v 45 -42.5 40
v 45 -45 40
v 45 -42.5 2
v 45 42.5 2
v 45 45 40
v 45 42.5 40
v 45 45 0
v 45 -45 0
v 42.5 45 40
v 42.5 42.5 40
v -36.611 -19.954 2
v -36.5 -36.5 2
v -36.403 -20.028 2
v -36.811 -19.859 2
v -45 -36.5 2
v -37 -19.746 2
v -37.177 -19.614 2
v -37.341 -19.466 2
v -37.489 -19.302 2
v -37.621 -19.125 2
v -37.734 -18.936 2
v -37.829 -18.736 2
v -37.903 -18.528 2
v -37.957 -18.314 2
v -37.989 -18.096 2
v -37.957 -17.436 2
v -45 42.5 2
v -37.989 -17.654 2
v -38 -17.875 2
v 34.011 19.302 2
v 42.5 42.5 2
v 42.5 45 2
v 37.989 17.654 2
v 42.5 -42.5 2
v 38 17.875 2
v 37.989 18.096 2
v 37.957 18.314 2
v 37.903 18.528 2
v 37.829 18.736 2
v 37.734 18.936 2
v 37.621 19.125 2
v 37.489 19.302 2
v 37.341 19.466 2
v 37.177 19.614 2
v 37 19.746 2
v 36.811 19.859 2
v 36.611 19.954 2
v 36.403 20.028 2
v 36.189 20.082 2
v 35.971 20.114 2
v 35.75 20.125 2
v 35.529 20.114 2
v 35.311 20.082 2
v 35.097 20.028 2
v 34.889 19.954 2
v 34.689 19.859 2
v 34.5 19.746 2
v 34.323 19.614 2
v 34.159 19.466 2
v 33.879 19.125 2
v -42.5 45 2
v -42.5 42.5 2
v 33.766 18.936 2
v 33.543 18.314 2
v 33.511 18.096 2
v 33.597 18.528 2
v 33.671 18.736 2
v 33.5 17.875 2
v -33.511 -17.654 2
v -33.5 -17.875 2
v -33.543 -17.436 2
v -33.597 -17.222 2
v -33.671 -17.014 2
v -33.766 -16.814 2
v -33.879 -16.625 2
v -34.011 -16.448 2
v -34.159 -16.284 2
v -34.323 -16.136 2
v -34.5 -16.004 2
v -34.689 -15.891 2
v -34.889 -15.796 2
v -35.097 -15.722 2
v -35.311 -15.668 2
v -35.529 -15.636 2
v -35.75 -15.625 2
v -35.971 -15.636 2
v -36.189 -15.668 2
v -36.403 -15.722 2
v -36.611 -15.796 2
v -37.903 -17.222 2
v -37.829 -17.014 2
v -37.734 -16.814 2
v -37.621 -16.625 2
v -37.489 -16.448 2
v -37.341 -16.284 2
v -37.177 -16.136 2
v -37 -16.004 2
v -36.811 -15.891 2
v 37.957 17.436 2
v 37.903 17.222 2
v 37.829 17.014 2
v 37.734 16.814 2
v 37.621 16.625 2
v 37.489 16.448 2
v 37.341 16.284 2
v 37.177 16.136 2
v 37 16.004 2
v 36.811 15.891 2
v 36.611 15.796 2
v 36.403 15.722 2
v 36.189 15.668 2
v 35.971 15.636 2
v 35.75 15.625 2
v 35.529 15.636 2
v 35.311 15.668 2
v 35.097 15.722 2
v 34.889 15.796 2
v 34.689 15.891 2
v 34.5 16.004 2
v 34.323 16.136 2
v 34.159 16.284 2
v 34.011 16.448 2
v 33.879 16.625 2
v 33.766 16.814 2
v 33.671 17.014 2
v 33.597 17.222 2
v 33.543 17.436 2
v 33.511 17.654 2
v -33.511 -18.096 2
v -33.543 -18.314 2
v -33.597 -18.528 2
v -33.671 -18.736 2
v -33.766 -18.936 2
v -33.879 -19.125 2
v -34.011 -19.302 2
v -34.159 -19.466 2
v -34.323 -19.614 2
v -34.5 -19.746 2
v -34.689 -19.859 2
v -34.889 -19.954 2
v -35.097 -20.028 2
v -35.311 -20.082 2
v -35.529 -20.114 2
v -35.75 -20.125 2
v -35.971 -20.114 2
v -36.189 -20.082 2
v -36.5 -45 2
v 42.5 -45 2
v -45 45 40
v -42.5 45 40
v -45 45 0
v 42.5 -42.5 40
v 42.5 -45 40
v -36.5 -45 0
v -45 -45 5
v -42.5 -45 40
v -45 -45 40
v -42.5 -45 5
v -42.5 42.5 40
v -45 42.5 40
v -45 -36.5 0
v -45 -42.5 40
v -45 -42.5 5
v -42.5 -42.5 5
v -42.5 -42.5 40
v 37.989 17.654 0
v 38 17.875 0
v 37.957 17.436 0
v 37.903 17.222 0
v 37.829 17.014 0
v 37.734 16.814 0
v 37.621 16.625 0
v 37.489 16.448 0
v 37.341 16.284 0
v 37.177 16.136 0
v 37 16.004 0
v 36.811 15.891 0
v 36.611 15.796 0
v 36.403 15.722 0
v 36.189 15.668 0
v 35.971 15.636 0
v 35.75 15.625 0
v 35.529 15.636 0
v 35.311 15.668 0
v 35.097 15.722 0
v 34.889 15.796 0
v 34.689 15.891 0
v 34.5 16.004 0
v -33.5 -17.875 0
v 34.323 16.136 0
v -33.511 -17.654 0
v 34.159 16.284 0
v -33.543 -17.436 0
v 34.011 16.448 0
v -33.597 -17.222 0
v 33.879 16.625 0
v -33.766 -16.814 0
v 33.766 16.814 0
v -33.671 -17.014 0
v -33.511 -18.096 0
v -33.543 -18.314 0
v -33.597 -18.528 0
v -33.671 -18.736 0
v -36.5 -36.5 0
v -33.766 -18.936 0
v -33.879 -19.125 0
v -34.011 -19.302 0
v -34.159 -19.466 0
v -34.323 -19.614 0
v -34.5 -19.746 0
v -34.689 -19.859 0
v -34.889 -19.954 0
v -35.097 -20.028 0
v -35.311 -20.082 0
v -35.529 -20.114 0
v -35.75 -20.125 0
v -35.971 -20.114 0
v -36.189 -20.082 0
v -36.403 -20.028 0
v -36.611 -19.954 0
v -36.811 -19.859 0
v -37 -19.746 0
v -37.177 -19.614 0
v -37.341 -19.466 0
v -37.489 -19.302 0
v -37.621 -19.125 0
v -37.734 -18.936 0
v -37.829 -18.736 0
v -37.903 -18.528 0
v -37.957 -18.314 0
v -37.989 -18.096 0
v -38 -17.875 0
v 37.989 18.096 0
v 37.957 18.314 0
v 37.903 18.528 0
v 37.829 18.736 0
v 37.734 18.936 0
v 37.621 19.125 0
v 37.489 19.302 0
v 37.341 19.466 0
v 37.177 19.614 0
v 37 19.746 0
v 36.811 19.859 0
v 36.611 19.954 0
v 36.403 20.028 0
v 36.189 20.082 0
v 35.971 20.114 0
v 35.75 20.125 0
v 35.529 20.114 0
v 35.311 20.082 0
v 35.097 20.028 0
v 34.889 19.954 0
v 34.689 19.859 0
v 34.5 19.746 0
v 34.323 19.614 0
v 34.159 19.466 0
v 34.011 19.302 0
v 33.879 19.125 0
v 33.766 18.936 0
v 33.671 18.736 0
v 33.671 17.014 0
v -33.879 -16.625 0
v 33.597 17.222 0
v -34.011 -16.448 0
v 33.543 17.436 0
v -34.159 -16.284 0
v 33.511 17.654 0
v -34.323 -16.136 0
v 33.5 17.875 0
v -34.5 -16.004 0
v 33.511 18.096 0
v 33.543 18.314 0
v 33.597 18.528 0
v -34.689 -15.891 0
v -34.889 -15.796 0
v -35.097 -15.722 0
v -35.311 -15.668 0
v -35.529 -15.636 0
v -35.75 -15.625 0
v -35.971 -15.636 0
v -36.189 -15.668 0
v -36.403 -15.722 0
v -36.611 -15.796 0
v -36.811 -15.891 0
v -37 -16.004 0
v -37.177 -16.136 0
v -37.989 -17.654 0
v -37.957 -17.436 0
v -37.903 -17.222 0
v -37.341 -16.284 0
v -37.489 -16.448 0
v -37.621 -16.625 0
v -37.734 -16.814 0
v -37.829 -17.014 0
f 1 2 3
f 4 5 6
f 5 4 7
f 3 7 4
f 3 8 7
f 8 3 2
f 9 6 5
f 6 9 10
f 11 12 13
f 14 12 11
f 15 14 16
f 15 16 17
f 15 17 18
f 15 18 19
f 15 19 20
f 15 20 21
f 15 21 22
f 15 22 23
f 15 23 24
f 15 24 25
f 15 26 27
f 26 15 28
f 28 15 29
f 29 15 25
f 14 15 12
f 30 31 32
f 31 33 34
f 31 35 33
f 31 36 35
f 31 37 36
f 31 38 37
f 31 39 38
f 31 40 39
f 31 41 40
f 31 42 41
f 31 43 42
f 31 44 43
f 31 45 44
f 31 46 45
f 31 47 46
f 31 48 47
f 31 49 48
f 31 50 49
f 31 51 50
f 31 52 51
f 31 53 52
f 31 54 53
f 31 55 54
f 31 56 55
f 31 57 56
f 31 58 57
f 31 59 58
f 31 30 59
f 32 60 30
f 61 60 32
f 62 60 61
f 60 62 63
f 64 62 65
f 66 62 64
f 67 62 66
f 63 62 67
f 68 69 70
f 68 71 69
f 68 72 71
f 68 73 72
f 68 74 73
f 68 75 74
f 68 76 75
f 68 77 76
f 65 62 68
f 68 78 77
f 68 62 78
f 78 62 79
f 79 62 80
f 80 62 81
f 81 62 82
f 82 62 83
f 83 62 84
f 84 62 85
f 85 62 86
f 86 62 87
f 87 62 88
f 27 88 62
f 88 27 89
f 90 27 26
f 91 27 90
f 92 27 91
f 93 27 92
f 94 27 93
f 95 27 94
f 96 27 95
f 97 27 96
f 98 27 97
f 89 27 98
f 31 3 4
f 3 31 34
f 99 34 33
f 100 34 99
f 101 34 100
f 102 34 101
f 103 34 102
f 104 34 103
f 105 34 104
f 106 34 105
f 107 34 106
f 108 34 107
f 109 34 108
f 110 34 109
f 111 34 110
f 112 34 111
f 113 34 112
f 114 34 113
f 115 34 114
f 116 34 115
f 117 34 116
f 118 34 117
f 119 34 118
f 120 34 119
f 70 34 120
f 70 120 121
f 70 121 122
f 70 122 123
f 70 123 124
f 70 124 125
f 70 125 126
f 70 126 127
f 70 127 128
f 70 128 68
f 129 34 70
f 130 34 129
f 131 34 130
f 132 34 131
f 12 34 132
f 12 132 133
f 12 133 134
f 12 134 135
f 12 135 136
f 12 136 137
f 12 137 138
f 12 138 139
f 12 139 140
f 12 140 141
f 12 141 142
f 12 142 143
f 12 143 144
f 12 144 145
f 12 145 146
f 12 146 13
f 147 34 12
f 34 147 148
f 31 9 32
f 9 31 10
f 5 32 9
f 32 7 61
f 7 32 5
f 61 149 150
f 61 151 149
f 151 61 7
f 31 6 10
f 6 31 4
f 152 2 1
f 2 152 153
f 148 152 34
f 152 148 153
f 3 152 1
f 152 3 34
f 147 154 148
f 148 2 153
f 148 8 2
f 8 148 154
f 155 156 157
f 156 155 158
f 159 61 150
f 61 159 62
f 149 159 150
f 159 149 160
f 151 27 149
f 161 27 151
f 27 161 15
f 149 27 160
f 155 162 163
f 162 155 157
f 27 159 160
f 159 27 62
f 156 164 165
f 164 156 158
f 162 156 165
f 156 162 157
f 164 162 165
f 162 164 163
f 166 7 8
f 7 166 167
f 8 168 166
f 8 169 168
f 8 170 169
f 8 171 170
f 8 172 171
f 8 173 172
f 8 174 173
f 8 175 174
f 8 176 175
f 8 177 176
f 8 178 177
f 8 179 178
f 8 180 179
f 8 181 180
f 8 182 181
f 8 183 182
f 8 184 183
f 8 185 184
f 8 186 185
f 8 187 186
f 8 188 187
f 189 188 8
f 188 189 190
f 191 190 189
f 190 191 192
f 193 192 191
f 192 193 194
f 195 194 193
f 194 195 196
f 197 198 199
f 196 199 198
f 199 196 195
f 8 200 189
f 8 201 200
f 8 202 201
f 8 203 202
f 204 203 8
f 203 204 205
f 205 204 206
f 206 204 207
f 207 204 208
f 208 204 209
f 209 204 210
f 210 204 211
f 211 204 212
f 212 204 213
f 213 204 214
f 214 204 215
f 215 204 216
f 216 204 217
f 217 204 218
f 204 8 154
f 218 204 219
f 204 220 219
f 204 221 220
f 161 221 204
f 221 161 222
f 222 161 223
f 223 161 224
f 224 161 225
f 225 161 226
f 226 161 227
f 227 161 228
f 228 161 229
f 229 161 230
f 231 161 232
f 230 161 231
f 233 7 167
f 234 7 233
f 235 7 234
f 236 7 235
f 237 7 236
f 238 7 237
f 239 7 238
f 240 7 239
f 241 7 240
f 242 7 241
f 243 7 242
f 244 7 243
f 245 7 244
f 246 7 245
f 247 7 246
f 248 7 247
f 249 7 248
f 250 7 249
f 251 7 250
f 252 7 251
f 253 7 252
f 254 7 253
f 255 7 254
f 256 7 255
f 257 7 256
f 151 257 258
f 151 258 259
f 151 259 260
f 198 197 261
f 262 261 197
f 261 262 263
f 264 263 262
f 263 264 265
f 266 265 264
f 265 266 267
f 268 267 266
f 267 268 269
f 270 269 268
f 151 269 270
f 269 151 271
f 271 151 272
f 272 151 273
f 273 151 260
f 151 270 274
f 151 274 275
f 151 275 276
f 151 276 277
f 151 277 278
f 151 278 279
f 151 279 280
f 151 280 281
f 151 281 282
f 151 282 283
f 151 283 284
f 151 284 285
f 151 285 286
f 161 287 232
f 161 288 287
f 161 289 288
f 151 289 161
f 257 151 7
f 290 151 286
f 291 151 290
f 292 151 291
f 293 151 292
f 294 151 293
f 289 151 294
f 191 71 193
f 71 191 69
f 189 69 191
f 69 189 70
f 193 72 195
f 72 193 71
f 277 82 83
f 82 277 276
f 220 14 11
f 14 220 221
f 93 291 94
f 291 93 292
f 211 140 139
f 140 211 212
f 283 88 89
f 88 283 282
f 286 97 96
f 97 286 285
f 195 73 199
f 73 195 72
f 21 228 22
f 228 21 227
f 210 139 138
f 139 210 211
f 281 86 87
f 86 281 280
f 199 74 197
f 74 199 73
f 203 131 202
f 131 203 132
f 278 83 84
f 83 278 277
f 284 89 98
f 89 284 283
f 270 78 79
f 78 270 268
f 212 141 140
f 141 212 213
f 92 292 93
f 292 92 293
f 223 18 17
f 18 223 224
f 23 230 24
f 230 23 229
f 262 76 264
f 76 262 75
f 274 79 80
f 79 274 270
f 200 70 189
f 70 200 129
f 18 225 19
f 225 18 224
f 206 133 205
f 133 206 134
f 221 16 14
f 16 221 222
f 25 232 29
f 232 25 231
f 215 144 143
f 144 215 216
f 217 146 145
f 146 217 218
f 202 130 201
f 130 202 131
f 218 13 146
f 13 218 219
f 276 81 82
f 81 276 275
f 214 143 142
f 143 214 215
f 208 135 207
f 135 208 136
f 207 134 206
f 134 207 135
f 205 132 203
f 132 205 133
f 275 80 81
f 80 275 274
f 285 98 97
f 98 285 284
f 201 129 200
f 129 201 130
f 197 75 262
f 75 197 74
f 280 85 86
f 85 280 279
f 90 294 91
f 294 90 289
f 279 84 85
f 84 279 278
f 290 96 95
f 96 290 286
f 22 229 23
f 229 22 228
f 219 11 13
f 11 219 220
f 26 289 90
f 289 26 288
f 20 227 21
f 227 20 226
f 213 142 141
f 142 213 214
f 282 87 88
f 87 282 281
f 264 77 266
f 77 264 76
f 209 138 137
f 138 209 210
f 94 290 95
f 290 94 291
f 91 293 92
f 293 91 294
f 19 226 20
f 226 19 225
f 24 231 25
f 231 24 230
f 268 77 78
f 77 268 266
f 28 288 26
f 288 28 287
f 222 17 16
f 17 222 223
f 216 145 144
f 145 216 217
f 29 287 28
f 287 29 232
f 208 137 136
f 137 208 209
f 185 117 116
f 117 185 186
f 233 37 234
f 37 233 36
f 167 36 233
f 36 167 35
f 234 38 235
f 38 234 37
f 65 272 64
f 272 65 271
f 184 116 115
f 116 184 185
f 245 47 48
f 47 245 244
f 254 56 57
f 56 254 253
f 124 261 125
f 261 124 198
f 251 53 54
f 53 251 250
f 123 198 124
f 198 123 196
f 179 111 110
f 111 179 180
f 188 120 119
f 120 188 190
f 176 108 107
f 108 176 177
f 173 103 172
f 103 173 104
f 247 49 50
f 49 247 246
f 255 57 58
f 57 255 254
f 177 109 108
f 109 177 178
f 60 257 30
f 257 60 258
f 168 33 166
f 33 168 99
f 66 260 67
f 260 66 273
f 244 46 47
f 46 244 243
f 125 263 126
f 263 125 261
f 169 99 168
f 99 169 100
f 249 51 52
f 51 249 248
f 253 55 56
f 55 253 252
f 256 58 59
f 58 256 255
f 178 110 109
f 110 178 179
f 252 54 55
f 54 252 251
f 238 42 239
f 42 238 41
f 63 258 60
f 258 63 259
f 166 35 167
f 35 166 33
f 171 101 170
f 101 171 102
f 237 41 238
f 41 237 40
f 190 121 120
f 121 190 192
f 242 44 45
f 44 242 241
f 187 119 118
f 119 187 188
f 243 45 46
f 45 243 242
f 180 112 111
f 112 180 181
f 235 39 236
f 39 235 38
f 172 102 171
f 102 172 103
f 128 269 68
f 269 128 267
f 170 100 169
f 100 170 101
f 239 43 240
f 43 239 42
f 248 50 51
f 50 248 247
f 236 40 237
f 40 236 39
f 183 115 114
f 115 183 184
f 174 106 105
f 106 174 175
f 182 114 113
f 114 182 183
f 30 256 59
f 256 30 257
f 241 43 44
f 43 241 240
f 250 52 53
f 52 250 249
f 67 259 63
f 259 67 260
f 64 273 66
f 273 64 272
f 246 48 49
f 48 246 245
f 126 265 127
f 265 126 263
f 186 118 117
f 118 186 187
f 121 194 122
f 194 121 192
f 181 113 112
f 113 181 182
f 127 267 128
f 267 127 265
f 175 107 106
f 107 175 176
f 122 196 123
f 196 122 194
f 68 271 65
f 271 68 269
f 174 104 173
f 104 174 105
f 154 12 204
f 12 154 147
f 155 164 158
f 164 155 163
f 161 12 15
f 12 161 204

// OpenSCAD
// DIY magnetic stirrer housing for 80 mm PC case fan
// Print orientation: top plate on bed (z = 0), walls build upward (+Z)

$fn = 64;

// ---- Dimensions (mm) ----
plate_thickness   = 2;     // top plate thickness (z = 0 to 2)
wall_thickness    = 2.5;   // side walls thickness (z = 2 to 40)
box_height        = 40;    // outer top of walls (z = 40)
outer_size        = 90;    // outer X and Y size of box
hole_size         = 4.5;   // M4 screw holes diameter
hole_pattern      = 71.5;  // square pitch of screw holes
notch_width       = 12;    // cable notch width in wall
notch_depth       = 8;     // cable notch depth from open edge
eps               = 0.5;   // cutter overshoot past faces

// ---- Derived ----
total_height = plate_thickness + wall_thickness; // 42 mm

// ---- Model ----
difference() {
    union() {
        // Top plate
        translate([-outer_size/2, -outer_size/2, 0])
            cube([outer_size, outer_size, plate_thickness]);

        // Four side walls, rising from top plate to open top
        for (sx = [-1, 1], sy = [-1, 1])
            translate([sx > 0 ? -outer_size/2 : outer_size/2 - wall_thickness,
                       sy > 0 ? -outer_size/2 : outer_size/2 - wall_thickness,
                       plate_thickness])
                cube([wall_thickness, wall_thickness, box_height - plate_thickness]);
    }

    // Screw holes through top plate on 71.5 mm square pattern
    for (i = [0 : 3]) {
        x = (i % 2 - 0.5) * hole_pattern;
        y = (i / 2 - 0.25) * hole_pattern;
        translate([x, y, -eps])
            cylinder(d = hole_size, h = plate_thickness + 2*eps);
    }

    // Cable notch in one wall, 12 mm wide, reaching 8 mm down from open edge
    translate([-outer_size/2 + wall_thickness - notch_width/2,
               -outer_size/2 + wall_thickness - notch_width/2,
               total_height - notch_depth])
        cube([notch_width, notch_width, notch_depth + eps]);
}
